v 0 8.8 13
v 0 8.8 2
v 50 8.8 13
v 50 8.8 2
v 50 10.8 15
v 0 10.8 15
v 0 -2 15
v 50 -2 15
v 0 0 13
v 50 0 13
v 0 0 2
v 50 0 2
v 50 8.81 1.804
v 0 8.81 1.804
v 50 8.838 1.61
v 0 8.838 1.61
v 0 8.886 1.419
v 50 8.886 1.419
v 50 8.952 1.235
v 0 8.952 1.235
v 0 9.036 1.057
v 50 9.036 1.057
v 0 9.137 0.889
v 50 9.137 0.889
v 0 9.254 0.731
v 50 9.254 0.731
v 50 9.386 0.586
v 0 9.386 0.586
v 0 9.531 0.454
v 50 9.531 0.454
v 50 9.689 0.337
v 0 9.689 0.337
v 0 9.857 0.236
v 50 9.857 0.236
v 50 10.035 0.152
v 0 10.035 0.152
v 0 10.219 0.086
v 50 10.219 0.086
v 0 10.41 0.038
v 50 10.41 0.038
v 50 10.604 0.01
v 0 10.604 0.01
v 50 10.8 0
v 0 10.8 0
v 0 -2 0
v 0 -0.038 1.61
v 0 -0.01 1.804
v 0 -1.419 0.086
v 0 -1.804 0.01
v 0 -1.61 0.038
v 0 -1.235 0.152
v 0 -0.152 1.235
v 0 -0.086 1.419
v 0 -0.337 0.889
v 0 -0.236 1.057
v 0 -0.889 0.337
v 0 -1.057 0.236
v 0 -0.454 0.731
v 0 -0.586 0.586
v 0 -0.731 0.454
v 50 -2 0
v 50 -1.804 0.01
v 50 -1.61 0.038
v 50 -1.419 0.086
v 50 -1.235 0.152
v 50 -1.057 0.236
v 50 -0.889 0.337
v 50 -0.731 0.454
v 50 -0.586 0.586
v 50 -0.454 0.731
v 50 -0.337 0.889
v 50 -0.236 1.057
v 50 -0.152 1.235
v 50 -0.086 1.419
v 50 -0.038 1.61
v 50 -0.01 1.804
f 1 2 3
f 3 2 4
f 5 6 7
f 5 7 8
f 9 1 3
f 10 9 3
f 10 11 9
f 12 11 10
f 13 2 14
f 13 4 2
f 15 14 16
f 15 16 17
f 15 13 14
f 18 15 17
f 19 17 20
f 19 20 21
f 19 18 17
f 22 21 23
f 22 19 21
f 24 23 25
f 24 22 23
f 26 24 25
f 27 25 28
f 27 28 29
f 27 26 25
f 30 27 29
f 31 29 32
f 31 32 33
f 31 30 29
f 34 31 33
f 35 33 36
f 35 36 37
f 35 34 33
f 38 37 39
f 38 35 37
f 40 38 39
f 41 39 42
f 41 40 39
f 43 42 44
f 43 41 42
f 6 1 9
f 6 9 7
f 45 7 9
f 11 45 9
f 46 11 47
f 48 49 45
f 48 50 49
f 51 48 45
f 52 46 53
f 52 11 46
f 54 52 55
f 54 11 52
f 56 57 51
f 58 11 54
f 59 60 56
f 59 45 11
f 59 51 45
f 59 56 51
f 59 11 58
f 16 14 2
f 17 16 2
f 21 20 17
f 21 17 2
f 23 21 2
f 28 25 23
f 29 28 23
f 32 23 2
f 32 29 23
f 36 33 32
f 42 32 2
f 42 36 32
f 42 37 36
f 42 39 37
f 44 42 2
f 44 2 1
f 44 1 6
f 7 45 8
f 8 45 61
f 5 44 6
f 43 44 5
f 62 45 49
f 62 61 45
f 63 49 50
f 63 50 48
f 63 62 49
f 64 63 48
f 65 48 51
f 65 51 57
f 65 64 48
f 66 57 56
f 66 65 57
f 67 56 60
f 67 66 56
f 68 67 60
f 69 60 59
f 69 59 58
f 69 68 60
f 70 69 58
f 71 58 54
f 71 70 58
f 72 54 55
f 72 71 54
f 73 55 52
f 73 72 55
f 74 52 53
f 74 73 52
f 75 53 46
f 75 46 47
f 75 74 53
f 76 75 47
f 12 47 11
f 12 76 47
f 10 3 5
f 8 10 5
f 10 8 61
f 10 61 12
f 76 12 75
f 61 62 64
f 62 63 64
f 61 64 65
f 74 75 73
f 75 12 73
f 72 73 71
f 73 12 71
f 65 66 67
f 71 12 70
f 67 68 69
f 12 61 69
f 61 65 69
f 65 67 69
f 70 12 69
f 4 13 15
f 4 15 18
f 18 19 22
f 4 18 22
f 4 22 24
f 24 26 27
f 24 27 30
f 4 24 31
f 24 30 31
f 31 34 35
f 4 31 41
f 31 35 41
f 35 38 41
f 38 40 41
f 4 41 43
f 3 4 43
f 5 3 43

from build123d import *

# Parameters (mm, degrees)
SKETCH_1_W        = 50
SKETCH_1_H        = 2
EXTRUDE_1_DEPTH   = 15
EXTRUDE_1_2_DEPTH = 15
SKETCH_2_W        = 50
SKETCH_2_H        = 12.8
EXTRUDE_2_DEPTH   = 2
FILLET_1_R        = 2


with BuildPart() as part:
    # 草图1 → 凸台-拉伸1 (new body)
    with BuildSketch(Plane.XY):
        with Locations((25, -1)):
            Rectangle(SKETCH_1_W, SKETCH_1_H)
    extrude(amount=EXTRUDE_1_DEPTH)



with BuildPart() as body_2:
    # 草图1 → Extrude 1 2 (new body)
    with BuildSketch(Plane.XY):
        with Locations((25, 9.8)):
            Rectangle(SKETCH_1_W, SKETCH_1_H)
    extrude(amount=EXTRUDE_1_2_DEPTH)


with BuildPart() as part_1:
    add(part.part)

    add(body_2.part)  # 凸台-拉伸2 merges body 2
    # 草图2 → 凸台-拉伸2 (add)
    with BuildSketch(Plane.XY.offset(15)):
        with Locations((25, 4.4)):
            Rectangle(SKETCH_2_W, SKETCH_2_H)
    extrude(amount=-EXTRUDE_2_DEPTH)

    # 圆角1
    fillet_1_edges = [part_1.edges().sort_by_distance(p)[0] for p in [
        (25, 0, 0),
        (25, 8.8, 0),
    ]]
    fillet(fillet_1_edges, radius=FILLET_1_R - 0.0001)  # a hair under: the kernel refuses the full size


solid = part_1.part
